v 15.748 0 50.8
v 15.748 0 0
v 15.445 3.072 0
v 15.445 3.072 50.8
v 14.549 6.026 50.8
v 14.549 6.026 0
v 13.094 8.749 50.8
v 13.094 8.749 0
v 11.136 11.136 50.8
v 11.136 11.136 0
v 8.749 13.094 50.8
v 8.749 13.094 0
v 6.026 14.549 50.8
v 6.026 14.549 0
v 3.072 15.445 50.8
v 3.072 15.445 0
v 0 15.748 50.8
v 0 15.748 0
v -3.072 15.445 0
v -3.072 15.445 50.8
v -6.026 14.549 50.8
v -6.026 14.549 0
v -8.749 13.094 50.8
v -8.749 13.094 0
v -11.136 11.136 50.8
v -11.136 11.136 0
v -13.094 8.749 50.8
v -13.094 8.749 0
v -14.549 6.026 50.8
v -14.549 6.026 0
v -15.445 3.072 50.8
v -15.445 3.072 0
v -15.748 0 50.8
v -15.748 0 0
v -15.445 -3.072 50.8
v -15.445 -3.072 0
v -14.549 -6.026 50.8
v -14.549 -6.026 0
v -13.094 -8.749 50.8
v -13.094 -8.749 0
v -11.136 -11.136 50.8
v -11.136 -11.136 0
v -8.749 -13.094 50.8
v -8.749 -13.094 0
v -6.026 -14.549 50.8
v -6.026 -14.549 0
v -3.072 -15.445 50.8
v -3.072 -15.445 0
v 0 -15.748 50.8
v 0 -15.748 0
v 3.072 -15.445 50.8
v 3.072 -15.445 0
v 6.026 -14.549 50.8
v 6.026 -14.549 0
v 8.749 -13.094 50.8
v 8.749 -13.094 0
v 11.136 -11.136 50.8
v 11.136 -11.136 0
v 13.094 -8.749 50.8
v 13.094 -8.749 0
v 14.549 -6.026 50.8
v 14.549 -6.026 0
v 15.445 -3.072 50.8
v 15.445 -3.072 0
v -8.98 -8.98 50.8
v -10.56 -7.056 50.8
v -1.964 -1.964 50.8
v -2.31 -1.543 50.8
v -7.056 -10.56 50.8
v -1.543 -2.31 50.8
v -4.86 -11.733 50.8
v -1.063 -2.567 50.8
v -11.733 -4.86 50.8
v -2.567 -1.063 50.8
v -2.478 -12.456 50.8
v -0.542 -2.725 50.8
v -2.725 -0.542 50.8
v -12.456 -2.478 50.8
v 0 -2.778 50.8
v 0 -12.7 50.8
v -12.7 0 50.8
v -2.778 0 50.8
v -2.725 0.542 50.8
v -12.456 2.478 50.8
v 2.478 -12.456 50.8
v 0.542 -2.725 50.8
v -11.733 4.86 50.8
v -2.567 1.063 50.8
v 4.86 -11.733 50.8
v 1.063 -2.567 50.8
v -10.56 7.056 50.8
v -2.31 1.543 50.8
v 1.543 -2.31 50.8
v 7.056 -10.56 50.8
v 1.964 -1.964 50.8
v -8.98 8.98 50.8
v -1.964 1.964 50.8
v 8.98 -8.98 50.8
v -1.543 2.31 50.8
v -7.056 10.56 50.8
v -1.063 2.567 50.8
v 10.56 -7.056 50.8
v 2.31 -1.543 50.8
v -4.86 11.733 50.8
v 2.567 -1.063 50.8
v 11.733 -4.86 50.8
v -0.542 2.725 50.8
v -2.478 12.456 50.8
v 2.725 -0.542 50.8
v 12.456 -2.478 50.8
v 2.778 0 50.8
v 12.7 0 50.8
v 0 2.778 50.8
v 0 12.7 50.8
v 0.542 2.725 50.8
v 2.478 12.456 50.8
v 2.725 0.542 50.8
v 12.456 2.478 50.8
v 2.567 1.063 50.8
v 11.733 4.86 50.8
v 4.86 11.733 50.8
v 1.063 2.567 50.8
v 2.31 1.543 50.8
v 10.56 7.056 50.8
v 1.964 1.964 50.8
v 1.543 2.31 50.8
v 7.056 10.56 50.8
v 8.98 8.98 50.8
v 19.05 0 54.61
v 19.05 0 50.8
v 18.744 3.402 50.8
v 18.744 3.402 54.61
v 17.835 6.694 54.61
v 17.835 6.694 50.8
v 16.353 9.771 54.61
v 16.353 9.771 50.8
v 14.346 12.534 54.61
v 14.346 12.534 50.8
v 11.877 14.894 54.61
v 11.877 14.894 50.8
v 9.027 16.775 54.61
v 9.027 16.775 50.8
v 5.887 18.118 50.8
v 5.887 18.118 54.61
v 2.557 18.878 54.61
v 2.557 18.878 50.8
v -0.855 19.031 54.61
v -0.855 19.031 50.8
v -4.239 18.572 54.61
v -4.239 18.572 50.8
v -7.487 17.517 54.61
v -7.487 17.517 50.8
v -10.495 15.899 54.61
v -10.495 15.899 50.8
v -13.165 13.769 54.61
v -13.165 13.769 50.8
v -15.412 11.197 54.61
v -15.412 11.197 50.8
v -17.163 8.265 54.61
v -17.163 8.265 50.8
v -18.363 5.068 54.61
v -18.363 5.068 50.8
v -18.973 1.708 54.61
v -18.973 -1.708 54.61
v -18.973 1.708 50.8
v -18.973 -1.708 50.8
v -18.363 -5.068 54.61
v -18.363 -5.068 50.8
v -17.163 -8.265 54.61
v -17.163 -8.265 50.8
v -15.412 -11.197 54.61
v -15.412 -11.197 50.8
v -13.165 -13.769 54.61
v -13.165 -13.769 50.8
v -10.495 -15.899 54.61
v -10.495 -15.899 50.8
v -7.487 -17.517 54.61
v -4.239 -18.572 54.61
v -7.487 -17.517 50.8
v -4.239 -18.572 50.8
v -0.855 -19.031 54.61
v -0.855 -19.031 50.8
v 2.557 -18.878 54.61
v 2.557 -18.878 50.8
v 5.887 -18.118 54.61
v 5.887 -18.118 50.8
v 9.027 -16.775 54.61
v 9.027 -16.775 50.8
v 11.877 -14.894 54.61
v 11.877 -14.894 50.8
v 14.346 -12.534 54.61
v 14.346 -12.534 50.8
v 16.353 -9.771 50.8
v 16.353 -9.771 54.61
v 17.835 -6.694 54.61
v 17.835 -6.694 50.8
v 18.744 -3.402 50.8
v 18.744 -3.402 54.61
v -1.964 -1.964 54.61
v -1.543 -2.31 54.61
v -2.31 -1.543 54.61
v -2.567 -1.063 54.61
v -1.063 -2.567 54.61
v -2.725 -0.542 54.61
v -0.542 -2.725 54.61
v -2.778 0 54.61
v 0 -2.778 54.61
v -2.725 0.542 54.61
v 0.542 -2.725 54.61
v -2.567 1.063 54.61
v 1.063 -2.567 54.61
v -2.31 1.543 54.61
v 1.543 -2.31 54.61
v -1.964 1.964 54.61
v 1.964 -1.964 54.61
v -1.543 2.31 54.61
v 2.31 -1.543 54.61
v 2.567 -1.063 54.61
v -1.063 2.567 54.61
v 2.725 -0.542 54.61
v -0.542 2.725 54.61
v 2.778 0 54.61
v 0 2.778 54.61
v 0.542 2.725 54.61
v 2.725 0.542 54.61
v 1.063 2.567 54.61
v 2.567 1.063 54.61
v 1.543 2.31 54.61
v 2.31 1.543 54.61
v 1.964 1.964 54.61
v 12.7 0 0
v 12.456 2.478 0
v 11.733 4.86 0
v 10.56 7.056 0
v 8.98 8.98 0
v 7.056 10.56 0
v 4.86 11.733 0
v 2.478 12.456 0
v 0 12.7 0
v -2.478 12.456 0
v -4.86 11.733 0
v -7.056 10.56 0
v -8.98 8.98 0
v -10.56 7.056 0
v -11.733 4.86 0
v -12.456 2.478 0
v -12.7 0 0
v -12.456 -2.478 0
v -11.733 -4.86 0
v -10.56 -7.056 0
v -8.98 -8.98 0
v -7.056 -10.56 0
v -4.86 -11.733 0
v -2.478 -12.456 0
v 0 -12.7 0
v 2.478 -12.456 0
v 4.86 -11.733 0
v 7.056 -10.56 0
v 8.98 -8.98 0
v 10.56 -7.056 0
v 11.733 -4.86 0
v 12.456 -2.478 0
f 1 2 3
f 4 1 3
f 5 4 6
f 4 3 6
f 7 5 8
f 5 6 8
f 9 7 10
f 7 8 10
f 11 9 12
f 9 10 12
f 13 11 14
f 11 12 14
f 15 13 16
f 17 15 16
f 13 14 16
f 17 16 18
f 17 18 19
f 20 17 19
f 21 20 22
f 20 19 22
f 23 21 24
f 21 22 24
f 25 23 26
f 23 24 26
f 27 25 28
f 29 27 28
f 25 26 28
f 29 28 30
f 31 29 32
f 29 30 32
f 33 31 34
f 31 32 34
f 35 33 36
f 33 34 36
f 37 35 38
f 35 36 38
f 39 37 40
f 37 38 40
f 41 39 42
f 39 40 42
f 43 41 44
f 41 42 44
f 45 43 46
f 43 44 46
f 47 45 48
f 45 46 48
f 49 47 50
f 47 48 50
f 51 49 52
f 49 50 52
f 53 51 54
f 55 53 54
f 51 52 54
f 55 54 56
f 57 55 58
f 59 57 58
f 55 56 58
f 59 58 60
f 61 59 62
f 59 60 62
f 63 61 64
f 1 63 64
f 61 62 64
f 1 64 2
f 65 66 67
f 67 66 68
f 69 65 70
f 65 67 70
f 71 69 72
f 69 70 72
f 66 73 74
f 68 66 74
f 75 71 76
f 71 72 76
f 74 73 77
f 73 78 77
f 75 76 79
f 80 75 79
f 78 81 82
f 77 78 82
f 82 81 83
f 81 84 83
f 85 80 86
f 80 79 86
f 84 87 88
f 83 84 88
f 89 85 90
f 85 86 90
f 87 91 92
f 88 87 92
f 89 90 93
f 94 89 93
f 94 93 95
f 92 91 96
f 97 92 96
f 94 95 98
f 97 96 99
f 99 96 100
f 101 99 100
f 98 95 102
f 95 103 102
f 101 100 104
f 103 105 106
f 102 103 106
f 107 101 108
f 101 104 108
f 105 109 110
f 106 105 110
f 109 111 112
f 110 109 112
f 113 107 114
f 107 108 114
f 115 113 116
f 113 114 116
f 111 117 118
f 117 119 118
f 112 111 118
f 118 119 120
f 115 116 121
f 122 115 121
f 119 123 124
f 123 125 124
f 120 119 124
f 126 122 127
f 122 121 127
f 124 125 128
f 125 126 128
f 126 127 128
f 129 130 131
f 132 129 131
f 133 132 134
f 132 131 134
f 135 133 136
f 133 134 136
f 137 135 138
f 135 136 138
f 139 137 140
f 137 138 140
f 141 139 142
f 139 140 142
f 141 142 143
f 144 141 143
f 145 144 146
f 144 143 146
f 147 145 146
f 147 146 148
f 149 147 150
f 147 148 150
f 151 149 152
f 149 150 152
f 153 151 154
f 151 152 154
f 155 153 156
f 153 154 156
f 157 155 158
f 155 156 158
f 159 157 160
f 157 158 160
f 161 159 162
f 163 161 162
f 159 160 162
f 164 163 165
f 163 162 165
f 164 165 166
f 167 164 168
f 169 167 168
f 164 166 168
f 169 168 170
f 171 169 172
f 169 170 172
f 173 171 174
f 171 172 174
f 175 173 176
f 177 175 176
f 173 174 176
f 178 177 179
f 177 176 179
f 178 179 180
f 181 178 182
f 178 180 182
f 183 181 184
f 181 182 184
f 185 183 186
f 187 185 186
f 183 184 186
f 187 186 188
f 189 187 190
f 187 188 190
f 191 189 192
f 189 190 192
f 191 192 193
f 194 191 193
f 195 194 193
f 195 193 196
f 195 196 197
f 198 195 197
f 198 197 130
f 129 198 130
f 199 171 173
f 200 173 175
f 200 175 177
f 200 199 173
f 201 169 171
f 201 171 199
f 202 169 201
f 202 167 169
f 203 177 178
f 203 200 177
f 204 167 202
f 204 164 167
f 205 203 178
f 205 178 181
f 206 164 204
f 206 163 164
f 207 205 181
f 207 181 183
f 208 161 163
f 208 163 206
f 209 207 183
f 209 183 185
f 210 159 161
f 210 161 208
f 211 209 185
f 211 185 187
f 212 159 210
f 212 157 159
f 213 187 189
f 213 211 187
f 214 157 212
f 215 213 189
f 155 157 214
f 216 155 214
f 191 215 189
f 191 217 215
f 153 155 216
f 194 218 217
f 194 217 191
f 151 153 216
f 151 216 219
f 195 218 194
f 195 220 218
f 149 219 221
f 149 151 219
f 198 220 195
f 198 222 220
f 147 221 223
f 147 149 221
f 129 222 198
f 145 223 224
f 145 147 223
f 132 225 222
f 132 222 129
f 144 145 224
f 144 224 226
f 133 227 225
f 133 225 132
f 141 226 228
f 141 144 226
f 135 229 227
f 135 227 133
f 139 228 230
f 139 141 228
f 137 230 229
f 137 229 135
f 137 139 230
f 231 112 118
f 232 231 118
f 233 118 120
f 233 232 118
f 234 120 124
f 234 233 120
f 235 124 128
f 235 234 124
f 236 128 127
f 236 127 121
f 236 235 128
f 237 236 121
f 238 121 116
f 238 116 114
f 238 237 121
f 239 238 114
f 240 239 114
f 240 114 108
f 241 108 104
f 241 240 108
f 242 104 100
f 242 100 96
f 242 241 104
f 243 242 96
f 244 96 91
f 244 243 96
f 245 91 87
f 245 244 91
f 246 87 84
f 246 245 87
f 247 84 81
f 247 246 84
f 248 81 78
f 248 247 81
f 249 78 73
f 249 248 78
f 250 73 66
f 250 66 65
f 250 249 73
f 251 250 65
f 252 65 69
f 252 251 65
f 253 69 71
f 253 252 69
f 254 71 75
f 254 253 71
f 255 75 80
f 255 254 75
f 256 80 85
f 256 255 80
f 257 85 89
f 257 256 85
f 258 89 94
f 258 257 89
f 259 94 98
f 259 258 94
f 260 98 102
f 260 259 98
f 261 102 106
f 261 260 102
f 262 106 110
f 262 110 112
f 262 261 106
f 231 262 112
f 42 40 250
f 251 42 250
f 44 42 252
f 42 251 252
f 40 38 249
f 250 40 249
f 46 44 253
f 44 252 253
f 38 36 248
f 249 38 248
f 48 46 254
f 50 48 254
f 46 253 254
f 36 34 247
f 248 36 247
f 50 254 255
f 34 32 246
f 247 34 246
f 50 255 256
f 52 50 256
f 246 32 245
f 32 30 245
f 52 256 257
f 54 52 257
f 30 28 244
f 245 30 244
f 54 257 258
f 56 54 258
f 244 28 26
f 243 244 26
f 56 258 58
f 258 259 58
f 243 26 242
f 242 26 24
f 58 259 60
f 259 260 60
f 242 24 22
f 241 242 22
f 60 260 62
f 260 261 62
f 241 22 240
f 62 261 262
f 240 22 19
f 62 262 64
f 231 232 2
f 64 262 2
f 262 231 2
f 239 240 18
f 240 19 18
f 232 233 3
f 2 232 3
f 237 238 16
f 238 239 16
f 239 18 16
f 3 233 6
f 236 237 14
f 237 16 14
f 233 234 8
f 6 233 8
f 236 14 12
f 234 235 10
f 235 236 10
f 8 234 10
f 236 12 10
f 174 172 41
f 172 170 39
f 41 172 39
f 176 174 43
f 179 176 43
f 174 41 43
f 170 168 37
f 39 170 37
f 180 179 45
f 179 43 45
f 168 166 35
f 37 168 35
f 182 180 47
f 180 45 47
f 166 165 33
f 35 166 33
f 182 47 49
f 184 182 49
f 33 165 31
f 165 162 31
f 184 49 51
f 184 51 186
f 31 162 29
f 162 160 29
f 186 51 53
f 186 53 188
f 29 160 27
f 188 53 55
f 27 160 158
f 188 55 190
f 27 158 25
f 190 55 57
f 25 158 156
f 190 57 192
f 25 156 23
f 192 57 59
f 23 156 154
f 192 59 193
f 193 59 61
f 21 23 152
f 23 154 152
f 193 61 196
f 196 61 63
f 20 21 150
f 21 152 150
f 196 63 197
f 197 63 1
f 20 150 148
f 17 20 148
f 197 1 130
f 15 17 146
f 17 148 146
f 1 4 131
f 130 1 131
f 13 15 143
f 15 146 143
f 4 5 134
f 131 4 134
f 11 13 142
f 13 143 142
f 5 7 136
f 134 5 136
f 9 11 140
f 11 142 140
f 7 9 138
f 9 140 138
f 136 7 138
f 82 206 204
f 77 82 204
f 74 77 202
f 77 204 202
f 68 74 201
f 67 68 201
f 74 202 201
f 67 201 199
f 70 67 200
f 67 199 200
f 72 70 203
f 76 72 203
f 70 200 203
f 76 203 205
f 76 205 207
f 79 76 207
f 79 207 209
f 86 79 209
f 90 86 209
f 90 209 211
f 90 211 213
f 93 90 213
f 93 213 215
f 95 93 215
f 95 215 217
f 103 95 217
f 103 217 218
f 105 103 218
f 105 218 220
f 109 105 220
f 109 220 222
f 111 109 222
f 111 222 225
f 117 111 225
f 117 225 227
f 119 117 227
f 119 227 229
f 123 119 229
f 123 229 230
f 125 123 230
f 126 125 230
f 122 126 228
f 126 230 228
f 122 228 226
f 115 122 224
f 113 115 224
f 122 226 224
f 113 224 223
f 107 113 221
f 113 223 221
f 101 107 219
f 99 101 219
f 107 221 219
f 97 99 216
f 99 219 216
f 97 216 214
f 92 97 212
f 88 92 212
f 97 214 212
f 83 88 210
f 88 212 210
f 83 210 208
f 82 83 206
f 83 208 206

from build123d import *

# Parameters (mm, degrees)
F0_R     = 15.748
F0_R_2   = 12.7
F1_DEPTH = 50.8
F2_R     = 19.05
F3_DEPTH = 3.81
F4_D     = 5.55625


with BuildPart() as f1:
    # F0 (on Top) → F1 (new body)
    with BuildSketch(Plane.XY):
        Circle(F0_R)
        Circle(F0_R_2, mode=Mode.SUBTRACT)
    extrude(amount=F1_DEPTH)

    # F2 (on face) → F3 (join)
    with BuildSketch(Plane.XY.offset(50.8)):
        Circle(F2_R)
    extrude(amount=F3_DEPTH)

    # F4 (through all)
    with Locations(Plane(origin=(0, 0, 50.8), x_dir=(1, 0, 0), z_dir=(0, 0, -1))):
        with Locations((0, 0)):
            Hole(F4_D / 2)


solid = f1.part
